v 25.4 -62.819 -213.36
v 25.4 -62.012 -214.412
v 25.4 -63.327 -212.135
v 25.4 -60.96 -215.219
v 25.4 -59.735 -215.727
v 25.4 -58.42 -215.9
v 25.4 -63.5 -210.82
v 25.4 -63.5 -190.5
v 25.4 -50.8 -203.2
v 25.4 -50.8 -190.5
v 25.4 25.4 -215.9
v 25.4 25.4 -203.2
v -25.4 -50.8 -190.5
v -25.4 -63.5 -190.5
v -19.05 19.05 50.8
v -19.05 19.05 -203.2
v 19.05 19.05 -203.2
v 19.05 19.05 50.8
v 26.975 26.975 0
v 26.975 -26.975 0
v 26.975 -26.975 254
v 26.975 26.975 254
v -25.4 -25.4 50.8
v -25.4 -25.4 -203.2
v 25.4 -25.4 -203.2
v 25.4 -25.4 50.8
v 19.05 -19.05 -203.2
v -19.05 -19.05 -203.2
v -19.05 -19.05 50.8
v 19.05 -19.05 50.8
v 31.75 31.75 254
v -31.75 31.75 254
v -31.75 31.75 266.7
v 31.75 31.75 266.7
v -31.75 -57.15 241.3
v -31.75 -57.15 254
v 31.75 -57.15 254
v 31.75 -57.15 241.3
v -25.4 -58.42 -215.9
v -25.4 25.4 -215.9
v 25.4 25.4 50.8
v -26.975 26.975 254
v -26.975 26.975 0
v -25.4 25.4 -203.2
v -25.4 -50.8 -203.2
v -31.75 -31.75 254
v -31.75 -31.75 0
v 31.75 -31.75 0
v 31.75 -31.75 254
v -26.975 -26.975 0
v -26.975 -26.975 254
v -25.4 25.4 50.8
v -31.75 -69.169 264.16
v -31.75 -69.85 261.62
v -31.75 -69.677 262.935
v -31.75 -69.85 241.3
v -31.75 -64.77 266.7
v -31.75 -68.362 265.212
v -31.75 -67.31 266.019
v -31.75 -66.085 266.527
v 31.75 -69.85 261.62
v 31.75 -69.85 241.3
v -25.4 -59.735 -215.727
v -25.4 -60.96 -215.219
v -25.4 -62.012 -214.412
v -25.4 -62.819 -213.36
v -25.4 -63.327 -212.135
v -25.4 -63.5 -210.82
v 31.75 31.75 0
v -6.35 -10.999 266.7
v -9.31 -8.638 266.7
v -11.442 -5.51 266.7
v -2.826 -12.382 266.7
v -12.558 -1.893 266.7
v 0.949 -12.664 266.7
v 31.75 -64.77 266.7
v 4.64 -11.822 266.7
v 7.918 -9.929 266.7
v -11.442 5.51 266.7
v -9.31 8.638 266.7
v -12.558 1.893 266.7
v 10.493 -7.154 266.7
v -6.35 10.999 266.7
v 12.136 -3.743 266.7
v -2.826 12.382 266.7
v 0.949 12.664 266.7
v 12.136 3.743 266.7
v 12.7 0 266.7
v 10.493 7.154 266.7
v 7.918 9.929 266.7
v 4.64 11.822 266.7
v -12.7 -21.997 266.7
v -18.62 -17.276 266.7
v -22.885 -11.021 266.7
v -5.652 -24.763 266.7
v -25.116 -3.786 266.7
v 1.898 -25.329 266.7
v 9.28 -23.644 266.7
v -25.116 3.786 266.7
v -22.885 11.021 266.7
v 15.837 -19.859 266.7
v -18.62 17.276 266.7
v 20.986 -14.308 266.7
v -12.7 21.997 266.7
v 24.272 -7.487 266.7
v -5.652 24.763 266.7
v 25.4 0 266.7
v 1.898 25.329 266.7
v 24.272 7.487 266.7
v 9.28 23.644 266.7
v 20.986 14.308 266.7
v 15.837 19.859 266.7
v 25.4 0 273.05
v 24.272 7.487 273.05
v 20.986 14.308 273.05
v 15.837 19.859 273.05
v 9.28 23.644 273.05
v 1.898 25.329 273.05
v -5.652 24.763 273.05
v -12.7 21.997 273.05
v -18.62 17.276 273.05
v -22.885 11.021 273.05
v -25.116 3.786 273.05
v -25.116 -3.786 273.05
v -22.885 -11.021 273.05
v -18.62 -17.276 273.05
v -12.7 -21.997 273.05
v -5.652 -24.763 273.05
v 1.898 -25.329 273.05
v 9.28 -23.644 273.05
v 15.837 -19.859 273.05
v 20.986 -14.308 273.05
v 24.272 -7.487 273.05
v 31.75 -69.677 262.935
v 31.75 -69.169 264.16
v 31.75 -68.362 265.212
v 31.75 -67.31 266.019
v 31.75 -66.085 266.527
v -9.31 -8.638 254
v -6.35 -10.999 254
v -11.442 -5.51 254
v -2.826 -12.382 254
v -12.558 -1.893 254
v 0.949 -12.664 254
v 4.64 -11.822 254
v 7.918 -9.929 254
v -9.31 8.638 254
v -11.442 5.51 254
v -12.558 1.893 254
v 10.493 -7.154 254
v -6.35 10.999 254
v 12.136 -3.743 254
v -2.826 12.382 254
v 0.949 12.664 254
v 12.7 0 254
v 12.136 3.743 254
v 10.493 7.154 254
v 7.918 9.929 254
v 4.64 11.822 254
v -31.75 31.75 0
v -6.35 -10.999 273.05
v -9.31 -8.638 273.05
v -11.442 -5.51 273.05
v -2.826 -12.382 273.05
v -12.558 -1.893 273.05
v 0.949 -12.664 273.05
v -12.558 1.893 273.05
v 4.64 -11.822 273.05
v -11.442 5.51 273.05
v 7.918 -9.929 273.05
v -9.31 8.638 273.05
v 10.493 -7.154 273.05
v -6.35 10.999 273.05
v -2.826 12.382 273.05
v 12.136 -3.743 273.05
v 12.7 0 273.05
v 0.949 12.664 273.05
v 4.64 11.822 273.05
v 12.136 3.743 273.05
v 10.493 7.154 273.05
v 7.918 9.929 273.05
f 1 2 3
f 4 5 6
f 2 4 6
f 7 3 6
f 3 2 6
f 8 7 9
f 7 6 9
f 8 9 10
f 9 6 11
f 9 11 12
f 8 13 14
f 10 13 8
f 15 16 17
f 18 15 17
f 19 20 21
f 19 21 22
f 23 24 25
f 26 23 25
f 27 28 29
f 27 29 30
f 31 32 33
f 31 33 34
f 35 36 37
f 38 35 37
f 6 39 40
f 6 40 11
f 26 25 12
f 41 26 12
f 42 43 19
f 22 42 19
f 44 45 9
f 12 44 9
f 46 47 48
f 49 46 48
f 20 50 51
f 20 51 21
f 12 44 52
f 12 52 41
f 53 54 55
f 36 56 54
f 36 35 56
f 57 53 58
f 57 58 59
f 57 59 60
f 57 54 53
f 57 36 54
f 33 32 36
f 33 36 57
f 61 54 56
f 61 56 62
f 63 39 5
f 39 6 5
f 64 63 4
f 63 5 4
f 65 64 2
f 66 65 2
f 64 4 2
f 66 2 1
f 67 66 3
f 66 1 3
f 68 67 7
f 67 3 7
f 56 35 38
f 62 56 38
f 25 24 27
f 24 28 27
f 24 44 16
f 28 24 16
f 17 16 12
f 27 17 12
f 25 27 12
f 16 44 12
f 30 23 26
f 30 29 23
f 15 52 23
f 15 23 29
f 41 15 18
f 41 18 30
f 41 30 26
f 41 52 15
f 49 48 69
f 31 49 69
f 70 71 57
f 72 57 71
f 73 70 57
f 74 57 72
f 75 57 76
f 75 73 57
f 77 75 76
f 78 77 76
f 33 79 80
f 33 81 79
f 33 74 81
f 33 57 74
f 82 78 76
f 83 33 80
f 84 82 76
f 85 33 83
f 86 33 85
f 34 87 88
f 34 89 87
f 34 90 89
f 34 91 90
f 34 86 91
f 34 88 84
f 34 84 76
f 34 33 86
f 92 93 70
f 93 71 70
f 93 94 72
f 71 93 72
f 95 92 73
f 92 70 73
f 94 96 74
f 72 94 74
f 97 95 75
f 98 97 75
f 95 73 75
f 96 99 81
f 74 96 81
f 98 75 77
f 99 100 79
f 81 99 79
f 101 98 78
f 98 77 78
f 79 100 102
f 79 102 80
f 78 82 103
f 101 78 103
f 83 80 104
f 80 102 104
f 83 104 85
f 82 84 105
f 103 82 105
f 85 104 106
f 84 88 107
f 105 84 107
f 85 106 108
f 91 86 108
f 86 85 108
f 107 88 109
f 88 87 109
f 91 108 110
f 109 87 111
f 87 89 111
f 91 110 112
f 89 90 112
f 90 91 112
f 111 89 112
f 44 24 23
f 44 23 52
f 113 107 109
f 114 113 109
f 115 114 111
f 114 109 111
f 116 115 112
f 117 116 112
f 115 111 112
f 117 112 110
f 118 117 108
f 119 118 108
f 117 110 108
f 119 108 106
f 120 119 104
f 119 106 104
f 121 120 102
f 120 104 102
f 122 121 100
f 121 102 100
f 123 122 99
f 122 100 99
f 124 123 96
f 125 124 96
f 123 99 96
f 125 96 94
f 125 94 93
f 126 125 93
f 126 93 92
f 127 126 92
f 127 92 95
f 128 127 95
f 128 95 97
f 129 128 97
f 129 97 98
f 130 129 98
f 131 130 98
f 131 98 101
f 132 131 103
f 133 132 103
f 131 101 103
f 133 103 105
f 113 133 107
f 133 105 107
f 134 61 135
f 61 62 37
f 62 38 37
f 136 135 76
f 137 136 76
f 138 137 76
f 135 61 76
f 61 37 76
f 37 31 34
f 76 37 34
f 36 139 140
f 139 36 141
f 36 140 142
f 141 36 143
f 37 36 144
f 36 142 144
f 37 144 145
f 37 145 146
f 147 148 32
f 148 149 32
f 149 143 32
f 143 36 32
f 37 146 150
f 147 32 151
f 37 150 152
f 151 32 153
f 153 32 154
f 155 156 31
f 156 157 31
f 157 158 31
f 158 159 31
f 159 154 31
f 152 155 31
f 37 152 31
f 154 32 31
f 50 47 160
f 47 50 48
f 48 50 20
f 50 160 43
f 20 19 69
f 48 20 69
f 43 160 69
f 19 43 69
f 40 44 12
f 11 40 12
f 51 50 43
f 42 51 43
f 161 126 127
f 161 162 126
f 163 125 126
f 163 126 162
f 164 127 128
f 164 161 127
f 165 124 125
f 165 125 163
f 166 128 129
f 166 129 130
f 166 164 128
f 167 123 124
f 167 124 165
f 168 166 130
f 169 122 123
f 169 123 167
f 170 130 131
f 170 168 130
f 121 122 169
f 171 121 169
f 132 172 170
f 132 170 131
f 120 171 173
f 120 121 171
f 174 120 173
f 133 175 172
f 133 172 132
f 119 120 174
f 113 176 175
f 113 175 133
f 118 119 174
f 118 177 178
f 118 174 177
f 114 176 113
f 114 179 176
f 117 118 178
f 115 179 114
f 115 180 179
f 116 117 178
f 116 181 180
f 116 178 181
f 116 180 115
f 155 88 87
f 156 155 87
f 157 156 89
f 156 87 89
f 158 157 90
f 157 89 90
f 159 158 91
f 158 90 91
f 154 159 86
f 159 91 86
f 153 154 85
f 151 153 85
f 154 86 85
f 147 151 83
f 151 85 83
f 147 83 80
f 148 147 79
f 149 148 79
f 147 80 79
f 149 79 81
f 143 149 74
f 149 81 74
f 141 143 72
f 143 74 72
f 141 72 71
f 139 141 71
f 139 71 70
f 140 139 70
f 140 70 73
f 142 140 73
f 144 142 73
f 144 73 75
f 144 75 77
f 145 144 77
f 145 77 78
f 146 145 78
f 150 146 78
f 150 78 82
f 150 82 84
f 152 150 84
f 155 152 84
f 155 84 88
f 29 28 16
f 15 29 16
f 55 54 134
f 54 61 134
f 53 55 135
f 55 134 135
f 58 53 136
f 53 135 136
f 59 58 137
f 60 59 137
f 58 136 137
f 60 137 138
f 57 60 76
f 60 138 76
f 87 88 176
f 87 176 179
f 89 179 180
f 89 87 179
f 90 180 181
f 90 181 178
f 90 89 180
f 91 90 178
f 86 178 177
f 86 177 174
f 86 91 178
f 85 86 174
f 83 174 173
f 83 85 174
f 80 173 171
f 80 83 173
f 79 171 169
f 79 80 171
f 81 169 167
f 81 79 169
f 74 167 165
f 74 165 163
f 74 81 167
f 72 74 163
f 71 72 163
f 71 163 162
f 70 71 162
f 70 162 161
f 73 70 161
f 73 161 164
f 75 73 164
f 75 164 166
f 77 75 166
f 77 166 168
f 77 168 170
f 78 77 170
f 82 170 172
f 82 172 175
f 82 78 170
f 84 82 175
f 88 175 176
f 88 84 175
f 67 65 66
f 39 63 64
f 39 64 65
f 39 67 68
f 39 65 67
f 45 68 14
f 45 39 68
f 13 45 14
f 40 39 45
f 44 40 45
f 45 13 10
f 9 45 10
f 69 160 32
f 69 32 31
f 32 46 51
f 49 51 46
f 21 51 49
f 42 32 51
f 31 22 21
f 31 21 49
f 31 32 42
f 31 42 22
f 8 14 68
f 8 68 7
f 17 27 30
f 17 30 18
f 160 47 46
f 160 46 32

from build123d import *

# Parameters (mm, degrees)
F0_W      = 50.8
F0_H      = 50.8
F0_W_2    = 38.1
F0_H_2    = 38.1
F1_DEPTH  = 254
F0_W_3    = 63.5
F0_H_3    = 63.5
F0_W_4    = 53.9496
F0_H_4    = 53.9496
F2_DEPTH  = 254
F4_W      = 63.5
F4_H      = 88.9
F5_DEPTH  = 12.7
F6_W      = 63.5
F6_H      = 25.4
F7_DEPTH  = 12.7
F8_R      = 12.7
F9_DEPTH  = 25.4
F10_W     = 50.8
F10_H     = 76.2
F11_DEPTH = 12.7
F12_W     = 50.8
F12_H     = 25.4
F13_DEPTH = 12.7
F14_R     = 5.08
F15_R     = 5.08
F16_R     = 25.4
F16_R_2   = 12.7
F17_DEPTH = 6.35


with BuildPart() as f1:
    # F0 (on Top) → F1 (new body)
    with BuildSketch(Plane.XY):
        Rectangle(F0_W, F0_H)
        Rectangle(F0_W_2, F0_H_2, mode=Mode.SUBTRACT)
    extrude(amount=F1_DEPTH)


with BuildPart() as f2:
    # F0 (on Top) → F2 (new body)
    with BuildSketch(Plane.XY):
        Rectangle(F0_W_3, F0_H_3)
        Rectangle(F0_W_4, F0_H_4, mode=Mode.SUBTRACT)
    extrude(amount=F2_DEPTH)


with BuildPart() as f1_1:
    # F3: moved
    add(f1.part.moved(Location((0, 0, -203.2))))


with BuildPart() as f5:
    # F4 (on face) → F5 (new body)
    with BuildSketch(Plane.XY.offset(254)):
        with Locations((0, -12.7)):
            Rectangle(F4_W, F4_H)
    extrude(amount=F5_DEPTH)

    # F6 (on face) → F7 (join)
    with BuildSketch(Plane.XZ.offset(57.15)):
        with Locations((0, 254)):
            Rectangle(F6_W, F6_H)
    extrude(amount=F7_DEPTH)

    # F8 (on face) → F9 (cut)
    with BuildSketch(Plane.XY.offset(266.7)):
        Circle(F8_R)
    extrude(amount=-F9_DEPTH, mode=Mode.SUBTRACT)

    # F15
    f15_edges = [f5.edges().sort_by_distance(p)[0] for p in [
        (0, -69.85, 266.7),
    ]]
    fillet(f15_edges, radius=F15_R)


with BuildPart() as f11:
    # F10 (on face) → F11 (new body)
    with BuildSketch(Plane(origin=(0, 0, -203.2), x_dir=(1, 0, 0), z_dir=(0, 0, -1))):
        with Locations((0, 12.7)):
            Rectangle(F10_W, F10_H)
    extrude(amount=F11_DEPTH)

    # F12 (on face) → F13 (join)
    with BuildSketch(Plane.XZ.offset(50.8)):
        with Locations((0, -203.2)):
            Rectangle(F12_W, F12_H)
    extrude(amount=F13_DEPTH)

    # F14
    f14_edges = [f11.edges().sort_by_distance(p)[0] for p in [
        (0, -63.5, -215.9),
    ]]
    fillet(f14_edges, radius=F14_R)


with BuildPart() as f17:
    # F16 (on face) → F17 (new body)
    with BuildSketch(Plane.XY.offset(266.7)):
        Circle(F16_R)
        Circle(F16_R_2, mode=Mode.SUBTRACT)
    extrude(amount=F17_DEPTH)


solid = Compound([f2.part, f1_1.part, f5.part, f11.part, f17.part])
